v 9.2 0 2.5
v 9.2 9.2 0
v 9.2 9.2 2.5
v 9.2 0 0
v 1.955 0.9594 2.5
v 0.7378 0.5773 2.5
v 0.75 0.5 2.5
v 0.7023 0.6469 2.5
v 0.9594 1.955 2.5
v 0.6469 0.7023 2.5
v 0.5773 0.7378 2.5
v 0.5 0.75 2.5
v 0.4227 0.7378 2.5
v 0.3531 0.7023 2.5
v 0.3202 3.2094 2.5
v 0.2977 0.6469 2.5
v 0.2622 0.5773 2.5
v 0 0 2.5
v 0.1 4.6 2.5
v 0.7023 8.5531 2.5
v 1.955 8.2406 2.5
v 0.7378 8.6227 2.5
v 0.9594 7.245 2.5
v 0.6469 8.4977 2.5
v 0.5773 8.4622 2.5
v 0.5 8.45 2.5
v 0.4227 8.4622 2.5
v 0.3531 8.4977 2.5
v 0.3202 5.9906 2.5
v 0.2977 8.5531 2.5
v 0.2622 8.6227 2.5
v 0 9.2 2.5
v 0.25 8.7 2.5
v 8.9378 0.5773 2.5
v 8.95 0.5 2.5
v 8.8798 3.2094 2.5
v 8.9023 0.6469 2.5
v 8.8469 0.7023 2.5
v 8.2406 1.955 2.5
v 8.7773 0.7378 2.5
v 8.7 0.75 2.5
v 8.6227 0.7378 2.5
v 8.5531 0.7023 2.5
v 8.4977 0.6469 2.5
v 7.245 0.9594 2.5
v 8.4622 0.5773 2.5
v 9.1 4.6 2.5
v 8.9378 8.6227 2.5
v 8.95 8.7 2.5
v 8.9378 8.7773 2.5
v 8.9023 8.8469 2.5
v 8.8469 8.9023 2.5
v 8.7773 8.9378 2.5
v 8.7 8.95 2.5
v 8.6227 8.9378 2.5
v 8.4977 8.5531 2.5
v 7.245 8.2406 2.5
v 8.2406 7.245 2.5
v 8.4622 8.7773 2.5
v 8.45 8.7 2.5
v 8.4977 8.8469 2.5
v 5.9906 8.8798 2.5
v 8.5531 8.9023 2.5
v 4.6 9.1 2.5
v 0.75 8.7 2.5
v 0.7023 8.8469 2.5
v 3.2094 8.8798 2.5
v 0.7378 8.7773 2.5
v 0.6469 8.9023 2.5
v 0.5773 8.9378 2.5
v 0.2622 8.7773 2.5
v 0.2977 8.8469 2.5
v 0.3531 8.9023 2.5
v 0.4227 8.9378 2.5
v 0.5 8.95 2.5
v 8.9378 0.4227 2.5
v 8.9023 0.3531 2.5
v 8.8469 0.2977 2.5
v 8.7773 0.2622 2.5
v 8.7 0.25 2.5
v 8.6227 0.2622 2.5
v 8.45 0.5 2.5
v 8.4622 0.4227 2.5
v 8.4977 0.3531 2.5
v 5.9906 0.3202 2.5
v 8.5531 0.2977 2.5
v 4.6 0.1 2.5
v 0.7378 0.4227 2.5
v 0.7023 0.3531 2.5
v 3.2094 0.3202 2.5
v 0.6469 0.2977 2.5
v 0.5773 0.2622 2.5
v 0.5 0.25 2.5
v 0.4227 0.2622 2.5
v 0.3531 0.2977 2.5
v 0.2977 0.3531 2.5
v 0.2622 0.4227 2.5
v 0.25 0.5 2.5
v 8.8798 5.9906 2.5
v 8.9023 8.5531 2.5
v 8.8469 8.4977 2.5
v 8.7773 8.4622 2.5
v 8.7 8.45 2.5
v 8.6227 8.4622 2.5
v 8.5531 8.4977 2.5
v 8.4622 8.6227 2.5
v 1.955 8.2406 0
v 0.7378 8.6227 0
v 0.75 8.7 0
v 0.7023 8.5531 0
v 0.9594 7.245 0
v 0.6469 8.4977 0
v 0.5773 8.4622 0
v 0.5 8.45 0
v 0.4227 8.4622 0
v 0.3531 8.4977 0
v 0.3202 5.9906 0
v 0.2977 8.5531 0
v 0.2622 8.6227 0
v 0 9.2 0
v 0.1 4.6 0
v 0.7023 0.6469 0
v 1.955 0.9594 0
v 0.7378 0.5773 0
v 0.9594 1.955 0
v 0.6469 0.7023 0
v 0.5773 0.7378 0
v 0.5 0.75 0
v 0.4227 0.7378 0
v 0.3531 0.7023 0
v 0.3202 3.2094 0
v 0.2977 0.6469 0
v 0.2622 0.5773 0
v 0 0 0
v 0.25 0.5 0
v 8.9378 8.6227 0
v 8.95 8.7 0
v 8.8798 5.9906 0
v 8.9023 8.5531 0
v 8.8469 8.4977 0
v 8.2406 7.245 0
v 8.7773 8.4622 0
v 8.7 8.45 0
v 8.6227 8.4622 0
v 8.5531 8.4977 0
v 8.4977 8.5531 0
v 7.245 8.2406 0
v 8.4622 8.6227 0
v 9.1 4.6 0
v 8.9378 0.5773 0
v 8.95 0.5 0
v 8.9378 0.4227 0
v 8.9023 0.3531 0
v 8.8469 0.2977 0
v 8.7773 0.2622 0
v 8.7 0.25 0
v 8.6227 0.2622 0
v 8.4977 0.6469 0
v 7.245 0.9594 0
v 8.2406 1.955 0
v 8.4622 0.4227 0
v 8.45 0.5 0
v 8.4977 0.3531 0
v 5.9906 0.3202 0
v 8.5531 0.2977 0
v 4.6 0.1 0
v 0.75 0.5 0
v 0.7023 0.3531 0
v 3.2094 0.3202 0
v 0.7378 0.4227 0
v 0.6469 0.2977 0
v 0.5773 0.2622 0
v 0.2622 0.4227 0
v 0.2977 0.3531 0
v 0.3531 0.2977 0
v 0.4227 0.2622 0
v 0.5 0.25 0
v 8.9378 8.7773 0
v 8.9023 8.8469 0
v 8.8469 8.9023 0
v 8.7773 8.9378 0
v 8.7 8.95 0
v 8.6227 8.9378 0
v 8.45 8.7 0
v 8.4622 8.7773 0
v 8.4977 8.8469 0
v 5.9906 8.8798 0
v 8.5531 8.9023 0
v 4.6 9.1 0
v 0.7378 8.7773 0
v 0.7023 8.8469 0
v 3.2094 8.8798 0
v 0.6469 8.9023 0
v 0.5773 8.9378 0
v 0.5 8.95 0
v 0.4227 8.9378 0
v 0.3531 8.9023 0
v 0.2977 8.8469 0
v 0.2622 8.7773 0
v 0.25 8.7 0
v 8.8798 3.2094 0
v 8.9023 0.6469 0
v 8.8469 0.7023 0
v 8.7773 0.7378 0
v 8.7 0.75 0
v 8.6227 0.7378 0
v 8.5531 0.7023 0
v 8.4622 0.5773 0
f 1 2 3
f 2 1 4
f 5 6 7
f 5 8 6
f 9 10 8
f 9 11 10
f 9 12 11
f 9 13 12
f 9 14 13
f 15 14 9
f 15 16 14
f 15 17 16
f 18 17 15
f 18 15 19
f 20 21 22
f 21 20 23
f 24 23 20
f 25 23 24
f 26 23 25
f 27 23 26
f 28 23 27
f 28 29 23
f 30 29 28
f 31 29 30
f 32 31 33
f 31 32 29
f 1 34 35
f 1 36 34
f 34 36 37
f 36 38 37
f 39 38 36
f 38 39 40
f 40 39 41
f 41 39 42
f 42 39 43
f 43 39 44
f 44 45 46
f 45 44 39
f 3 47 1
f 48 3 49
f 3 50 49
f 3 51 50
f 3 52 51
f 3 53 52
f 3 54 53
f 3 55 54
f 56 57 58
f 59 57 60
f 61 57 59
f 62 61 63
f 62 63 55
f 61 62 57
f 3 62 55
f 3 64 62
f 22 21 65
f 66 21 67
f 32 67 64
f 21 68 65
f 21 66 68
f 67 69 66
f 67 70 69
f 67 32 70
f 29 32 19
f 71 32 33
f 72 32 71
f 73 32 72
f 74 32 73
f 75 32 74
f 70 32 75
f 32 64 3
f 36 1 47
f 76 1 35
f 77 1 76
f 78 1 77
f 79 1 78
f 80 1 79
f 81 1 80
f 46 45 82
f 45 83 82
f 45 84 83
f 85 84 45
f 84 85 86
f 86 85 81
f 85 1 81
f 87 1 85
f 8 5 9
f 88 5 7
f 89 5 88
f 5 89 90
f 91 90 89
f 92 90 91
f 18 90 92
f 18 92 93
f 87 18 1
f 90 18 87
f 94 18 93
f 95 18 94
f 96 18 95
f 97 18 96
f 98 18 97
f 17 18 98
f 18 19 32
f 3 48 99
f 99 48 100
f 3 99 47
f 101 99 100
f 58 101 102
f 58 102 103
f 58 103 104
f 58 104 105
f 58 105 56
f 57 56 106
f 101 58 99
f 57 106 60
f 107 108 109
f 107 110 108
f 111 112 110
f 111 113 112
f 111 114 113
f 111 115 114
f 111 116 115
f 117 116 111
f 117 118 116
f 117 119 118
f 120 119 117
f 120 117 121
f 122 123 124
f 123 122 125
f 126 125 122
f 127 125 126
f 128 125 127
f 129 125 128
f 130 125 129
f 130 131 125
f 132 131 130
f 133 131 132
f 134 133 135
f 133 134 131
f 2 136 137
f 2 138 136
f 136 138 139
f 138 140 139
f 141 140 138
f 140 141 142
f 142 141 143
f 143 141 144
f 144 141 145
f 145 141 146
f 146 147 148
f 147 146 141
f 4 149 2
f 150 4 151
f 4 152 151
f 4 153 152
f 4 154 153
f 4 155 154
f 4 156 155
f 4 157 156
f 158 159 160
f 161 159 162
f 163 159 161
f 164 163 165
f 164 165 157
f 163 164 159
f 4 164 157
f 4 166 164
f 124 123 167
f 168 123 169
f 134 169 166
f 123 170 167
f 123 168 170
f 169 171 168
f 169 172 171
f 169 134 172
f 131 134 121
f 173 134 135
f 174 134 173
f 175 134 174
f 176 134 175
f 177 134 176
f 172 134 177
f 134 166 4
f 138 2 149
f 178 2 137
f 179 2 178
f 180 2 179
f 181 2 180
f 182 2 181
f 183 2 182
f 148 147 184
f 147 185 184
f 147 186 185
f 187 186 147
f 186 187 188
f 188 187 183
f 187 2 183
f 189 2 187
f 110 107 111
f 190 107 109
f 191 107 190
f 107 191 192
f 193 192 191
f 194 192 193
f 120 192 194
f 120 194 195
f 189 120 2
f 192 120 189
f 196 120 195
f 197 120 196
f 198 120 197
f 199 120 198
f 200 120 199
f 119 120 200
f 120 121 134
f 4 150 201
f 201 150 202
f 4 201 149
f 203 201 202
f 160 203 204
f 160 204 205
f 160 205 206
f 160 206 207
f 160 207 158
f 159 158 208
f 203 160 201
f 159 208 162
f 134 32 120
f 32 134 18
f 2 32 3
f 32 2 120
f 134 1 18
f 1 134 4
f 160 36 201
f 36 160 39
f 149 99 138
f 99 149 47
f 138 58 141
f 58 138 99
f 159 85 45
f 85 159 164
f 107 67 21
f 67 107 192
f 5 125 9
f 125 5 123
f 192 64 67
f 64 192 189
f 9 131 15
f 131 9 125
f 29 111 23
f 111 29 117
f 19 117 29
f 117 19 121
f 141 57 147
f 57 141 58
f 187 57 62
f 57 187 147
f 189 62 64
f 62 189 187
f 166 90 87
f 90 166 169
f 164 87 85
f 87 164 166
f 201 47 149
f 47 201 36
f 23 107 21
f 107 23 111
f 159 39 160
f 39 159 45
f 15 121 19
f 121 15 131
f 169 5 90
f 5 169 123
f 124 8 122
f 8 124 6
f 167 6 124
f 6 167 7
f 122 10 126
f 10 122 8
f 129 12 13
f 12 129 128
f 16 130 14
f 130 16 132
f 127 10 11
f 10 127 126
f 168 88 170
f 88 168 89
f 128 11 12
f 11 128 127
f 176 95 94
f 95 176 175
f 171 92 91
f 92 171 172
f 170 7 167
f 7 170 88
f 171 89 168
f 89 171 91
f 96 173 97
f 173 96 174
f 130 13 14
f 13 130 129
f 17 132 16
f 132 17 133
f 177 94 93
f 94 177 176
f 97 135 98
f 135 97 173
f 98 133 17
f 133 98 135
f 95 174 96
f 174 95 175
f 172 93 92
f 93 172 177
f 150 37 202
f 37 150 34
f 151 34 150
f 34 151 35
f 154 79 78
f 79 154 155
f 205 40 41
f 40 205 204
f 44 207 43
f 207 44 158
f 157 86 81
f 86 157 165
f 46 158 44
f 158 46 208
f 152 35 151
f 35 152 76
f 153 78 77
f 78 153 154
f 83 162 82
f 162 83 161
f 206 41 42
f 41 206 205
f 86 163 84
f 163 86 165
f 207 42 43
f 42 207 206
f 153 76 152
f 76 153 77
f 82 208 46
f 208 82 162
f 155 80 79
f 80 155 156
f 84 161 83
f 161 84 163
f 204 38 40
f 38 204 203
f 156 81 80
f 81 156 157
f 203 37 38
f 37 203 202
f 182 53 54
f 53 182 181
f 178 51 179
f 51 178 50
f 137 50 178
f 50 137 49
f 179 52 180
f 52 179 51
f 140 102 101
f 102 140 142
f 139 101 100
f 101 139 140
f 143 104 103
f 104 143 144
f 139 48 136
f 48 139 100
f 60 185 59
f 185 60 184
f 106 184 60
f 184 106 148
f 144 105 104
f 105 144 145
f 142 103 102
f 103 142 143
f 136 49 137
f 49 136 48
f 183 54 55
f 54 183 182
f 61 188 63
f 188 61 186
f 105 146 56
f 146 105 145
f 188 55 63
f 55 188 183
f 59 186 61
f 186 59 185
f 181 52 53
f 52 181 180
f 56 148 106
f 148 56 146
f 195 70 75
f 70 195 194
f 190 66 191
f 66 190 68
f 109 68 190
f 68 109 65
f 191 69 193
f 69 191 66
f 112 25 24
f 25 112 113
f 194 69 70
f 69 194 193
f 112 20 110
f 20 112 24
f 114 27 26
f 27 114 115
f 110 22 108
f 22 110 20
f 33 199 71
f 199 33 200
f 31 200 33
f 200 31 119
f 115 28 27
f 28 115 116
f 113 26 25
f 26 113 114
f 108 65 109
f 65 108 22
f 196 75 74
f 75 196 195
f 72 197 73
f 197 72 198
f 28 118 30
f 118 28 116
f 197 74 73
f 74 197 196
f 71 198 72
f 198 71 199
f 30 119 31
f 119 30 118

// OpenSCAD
module fan(solid_holes = 0)
{
    color("DarkSlateGray") difference()
    {
        cube([9.2, 9.2, 2.5]);
        translate([4.6, 4.6, -0.1]) cylinder(d = 9, h = 2.7);
        translate([0.5, 0.5, -0.1]) cylinder(d = 0.5, h = 2.7);
        translate([8.7, 0.5, -0.1]) cylinder(d = 0.5, h = 2.7);
        translate([8.7, 8.7, -0.1]) cylinder(d = 0.5, h = 2.7);
        translate([0.5, 8.7, -0.1]) cylinder(d = 0.5, h = 2.7);
    }
    
    if(solid_holes) {
        translate([4.6, 4.6, 1]) cylinder(d = 9, h = 3.7);
        translate([0.5, 0.5, 1]) cylinder(d = 0.5, h = 3.7);
        translate([8.7, 0.5, 1]) cylinder(d = 0.5, h = 3.7);
        translate([8.7, 8.7, 1]) cylinder(d = 0.5, h = 3.7);
        translate([0.5, 8.7, 1]) cylinder(d = 0.5, h = 3.7);
    }
}

module test()
{
    $fn = 20;
    fan();
}

test();
